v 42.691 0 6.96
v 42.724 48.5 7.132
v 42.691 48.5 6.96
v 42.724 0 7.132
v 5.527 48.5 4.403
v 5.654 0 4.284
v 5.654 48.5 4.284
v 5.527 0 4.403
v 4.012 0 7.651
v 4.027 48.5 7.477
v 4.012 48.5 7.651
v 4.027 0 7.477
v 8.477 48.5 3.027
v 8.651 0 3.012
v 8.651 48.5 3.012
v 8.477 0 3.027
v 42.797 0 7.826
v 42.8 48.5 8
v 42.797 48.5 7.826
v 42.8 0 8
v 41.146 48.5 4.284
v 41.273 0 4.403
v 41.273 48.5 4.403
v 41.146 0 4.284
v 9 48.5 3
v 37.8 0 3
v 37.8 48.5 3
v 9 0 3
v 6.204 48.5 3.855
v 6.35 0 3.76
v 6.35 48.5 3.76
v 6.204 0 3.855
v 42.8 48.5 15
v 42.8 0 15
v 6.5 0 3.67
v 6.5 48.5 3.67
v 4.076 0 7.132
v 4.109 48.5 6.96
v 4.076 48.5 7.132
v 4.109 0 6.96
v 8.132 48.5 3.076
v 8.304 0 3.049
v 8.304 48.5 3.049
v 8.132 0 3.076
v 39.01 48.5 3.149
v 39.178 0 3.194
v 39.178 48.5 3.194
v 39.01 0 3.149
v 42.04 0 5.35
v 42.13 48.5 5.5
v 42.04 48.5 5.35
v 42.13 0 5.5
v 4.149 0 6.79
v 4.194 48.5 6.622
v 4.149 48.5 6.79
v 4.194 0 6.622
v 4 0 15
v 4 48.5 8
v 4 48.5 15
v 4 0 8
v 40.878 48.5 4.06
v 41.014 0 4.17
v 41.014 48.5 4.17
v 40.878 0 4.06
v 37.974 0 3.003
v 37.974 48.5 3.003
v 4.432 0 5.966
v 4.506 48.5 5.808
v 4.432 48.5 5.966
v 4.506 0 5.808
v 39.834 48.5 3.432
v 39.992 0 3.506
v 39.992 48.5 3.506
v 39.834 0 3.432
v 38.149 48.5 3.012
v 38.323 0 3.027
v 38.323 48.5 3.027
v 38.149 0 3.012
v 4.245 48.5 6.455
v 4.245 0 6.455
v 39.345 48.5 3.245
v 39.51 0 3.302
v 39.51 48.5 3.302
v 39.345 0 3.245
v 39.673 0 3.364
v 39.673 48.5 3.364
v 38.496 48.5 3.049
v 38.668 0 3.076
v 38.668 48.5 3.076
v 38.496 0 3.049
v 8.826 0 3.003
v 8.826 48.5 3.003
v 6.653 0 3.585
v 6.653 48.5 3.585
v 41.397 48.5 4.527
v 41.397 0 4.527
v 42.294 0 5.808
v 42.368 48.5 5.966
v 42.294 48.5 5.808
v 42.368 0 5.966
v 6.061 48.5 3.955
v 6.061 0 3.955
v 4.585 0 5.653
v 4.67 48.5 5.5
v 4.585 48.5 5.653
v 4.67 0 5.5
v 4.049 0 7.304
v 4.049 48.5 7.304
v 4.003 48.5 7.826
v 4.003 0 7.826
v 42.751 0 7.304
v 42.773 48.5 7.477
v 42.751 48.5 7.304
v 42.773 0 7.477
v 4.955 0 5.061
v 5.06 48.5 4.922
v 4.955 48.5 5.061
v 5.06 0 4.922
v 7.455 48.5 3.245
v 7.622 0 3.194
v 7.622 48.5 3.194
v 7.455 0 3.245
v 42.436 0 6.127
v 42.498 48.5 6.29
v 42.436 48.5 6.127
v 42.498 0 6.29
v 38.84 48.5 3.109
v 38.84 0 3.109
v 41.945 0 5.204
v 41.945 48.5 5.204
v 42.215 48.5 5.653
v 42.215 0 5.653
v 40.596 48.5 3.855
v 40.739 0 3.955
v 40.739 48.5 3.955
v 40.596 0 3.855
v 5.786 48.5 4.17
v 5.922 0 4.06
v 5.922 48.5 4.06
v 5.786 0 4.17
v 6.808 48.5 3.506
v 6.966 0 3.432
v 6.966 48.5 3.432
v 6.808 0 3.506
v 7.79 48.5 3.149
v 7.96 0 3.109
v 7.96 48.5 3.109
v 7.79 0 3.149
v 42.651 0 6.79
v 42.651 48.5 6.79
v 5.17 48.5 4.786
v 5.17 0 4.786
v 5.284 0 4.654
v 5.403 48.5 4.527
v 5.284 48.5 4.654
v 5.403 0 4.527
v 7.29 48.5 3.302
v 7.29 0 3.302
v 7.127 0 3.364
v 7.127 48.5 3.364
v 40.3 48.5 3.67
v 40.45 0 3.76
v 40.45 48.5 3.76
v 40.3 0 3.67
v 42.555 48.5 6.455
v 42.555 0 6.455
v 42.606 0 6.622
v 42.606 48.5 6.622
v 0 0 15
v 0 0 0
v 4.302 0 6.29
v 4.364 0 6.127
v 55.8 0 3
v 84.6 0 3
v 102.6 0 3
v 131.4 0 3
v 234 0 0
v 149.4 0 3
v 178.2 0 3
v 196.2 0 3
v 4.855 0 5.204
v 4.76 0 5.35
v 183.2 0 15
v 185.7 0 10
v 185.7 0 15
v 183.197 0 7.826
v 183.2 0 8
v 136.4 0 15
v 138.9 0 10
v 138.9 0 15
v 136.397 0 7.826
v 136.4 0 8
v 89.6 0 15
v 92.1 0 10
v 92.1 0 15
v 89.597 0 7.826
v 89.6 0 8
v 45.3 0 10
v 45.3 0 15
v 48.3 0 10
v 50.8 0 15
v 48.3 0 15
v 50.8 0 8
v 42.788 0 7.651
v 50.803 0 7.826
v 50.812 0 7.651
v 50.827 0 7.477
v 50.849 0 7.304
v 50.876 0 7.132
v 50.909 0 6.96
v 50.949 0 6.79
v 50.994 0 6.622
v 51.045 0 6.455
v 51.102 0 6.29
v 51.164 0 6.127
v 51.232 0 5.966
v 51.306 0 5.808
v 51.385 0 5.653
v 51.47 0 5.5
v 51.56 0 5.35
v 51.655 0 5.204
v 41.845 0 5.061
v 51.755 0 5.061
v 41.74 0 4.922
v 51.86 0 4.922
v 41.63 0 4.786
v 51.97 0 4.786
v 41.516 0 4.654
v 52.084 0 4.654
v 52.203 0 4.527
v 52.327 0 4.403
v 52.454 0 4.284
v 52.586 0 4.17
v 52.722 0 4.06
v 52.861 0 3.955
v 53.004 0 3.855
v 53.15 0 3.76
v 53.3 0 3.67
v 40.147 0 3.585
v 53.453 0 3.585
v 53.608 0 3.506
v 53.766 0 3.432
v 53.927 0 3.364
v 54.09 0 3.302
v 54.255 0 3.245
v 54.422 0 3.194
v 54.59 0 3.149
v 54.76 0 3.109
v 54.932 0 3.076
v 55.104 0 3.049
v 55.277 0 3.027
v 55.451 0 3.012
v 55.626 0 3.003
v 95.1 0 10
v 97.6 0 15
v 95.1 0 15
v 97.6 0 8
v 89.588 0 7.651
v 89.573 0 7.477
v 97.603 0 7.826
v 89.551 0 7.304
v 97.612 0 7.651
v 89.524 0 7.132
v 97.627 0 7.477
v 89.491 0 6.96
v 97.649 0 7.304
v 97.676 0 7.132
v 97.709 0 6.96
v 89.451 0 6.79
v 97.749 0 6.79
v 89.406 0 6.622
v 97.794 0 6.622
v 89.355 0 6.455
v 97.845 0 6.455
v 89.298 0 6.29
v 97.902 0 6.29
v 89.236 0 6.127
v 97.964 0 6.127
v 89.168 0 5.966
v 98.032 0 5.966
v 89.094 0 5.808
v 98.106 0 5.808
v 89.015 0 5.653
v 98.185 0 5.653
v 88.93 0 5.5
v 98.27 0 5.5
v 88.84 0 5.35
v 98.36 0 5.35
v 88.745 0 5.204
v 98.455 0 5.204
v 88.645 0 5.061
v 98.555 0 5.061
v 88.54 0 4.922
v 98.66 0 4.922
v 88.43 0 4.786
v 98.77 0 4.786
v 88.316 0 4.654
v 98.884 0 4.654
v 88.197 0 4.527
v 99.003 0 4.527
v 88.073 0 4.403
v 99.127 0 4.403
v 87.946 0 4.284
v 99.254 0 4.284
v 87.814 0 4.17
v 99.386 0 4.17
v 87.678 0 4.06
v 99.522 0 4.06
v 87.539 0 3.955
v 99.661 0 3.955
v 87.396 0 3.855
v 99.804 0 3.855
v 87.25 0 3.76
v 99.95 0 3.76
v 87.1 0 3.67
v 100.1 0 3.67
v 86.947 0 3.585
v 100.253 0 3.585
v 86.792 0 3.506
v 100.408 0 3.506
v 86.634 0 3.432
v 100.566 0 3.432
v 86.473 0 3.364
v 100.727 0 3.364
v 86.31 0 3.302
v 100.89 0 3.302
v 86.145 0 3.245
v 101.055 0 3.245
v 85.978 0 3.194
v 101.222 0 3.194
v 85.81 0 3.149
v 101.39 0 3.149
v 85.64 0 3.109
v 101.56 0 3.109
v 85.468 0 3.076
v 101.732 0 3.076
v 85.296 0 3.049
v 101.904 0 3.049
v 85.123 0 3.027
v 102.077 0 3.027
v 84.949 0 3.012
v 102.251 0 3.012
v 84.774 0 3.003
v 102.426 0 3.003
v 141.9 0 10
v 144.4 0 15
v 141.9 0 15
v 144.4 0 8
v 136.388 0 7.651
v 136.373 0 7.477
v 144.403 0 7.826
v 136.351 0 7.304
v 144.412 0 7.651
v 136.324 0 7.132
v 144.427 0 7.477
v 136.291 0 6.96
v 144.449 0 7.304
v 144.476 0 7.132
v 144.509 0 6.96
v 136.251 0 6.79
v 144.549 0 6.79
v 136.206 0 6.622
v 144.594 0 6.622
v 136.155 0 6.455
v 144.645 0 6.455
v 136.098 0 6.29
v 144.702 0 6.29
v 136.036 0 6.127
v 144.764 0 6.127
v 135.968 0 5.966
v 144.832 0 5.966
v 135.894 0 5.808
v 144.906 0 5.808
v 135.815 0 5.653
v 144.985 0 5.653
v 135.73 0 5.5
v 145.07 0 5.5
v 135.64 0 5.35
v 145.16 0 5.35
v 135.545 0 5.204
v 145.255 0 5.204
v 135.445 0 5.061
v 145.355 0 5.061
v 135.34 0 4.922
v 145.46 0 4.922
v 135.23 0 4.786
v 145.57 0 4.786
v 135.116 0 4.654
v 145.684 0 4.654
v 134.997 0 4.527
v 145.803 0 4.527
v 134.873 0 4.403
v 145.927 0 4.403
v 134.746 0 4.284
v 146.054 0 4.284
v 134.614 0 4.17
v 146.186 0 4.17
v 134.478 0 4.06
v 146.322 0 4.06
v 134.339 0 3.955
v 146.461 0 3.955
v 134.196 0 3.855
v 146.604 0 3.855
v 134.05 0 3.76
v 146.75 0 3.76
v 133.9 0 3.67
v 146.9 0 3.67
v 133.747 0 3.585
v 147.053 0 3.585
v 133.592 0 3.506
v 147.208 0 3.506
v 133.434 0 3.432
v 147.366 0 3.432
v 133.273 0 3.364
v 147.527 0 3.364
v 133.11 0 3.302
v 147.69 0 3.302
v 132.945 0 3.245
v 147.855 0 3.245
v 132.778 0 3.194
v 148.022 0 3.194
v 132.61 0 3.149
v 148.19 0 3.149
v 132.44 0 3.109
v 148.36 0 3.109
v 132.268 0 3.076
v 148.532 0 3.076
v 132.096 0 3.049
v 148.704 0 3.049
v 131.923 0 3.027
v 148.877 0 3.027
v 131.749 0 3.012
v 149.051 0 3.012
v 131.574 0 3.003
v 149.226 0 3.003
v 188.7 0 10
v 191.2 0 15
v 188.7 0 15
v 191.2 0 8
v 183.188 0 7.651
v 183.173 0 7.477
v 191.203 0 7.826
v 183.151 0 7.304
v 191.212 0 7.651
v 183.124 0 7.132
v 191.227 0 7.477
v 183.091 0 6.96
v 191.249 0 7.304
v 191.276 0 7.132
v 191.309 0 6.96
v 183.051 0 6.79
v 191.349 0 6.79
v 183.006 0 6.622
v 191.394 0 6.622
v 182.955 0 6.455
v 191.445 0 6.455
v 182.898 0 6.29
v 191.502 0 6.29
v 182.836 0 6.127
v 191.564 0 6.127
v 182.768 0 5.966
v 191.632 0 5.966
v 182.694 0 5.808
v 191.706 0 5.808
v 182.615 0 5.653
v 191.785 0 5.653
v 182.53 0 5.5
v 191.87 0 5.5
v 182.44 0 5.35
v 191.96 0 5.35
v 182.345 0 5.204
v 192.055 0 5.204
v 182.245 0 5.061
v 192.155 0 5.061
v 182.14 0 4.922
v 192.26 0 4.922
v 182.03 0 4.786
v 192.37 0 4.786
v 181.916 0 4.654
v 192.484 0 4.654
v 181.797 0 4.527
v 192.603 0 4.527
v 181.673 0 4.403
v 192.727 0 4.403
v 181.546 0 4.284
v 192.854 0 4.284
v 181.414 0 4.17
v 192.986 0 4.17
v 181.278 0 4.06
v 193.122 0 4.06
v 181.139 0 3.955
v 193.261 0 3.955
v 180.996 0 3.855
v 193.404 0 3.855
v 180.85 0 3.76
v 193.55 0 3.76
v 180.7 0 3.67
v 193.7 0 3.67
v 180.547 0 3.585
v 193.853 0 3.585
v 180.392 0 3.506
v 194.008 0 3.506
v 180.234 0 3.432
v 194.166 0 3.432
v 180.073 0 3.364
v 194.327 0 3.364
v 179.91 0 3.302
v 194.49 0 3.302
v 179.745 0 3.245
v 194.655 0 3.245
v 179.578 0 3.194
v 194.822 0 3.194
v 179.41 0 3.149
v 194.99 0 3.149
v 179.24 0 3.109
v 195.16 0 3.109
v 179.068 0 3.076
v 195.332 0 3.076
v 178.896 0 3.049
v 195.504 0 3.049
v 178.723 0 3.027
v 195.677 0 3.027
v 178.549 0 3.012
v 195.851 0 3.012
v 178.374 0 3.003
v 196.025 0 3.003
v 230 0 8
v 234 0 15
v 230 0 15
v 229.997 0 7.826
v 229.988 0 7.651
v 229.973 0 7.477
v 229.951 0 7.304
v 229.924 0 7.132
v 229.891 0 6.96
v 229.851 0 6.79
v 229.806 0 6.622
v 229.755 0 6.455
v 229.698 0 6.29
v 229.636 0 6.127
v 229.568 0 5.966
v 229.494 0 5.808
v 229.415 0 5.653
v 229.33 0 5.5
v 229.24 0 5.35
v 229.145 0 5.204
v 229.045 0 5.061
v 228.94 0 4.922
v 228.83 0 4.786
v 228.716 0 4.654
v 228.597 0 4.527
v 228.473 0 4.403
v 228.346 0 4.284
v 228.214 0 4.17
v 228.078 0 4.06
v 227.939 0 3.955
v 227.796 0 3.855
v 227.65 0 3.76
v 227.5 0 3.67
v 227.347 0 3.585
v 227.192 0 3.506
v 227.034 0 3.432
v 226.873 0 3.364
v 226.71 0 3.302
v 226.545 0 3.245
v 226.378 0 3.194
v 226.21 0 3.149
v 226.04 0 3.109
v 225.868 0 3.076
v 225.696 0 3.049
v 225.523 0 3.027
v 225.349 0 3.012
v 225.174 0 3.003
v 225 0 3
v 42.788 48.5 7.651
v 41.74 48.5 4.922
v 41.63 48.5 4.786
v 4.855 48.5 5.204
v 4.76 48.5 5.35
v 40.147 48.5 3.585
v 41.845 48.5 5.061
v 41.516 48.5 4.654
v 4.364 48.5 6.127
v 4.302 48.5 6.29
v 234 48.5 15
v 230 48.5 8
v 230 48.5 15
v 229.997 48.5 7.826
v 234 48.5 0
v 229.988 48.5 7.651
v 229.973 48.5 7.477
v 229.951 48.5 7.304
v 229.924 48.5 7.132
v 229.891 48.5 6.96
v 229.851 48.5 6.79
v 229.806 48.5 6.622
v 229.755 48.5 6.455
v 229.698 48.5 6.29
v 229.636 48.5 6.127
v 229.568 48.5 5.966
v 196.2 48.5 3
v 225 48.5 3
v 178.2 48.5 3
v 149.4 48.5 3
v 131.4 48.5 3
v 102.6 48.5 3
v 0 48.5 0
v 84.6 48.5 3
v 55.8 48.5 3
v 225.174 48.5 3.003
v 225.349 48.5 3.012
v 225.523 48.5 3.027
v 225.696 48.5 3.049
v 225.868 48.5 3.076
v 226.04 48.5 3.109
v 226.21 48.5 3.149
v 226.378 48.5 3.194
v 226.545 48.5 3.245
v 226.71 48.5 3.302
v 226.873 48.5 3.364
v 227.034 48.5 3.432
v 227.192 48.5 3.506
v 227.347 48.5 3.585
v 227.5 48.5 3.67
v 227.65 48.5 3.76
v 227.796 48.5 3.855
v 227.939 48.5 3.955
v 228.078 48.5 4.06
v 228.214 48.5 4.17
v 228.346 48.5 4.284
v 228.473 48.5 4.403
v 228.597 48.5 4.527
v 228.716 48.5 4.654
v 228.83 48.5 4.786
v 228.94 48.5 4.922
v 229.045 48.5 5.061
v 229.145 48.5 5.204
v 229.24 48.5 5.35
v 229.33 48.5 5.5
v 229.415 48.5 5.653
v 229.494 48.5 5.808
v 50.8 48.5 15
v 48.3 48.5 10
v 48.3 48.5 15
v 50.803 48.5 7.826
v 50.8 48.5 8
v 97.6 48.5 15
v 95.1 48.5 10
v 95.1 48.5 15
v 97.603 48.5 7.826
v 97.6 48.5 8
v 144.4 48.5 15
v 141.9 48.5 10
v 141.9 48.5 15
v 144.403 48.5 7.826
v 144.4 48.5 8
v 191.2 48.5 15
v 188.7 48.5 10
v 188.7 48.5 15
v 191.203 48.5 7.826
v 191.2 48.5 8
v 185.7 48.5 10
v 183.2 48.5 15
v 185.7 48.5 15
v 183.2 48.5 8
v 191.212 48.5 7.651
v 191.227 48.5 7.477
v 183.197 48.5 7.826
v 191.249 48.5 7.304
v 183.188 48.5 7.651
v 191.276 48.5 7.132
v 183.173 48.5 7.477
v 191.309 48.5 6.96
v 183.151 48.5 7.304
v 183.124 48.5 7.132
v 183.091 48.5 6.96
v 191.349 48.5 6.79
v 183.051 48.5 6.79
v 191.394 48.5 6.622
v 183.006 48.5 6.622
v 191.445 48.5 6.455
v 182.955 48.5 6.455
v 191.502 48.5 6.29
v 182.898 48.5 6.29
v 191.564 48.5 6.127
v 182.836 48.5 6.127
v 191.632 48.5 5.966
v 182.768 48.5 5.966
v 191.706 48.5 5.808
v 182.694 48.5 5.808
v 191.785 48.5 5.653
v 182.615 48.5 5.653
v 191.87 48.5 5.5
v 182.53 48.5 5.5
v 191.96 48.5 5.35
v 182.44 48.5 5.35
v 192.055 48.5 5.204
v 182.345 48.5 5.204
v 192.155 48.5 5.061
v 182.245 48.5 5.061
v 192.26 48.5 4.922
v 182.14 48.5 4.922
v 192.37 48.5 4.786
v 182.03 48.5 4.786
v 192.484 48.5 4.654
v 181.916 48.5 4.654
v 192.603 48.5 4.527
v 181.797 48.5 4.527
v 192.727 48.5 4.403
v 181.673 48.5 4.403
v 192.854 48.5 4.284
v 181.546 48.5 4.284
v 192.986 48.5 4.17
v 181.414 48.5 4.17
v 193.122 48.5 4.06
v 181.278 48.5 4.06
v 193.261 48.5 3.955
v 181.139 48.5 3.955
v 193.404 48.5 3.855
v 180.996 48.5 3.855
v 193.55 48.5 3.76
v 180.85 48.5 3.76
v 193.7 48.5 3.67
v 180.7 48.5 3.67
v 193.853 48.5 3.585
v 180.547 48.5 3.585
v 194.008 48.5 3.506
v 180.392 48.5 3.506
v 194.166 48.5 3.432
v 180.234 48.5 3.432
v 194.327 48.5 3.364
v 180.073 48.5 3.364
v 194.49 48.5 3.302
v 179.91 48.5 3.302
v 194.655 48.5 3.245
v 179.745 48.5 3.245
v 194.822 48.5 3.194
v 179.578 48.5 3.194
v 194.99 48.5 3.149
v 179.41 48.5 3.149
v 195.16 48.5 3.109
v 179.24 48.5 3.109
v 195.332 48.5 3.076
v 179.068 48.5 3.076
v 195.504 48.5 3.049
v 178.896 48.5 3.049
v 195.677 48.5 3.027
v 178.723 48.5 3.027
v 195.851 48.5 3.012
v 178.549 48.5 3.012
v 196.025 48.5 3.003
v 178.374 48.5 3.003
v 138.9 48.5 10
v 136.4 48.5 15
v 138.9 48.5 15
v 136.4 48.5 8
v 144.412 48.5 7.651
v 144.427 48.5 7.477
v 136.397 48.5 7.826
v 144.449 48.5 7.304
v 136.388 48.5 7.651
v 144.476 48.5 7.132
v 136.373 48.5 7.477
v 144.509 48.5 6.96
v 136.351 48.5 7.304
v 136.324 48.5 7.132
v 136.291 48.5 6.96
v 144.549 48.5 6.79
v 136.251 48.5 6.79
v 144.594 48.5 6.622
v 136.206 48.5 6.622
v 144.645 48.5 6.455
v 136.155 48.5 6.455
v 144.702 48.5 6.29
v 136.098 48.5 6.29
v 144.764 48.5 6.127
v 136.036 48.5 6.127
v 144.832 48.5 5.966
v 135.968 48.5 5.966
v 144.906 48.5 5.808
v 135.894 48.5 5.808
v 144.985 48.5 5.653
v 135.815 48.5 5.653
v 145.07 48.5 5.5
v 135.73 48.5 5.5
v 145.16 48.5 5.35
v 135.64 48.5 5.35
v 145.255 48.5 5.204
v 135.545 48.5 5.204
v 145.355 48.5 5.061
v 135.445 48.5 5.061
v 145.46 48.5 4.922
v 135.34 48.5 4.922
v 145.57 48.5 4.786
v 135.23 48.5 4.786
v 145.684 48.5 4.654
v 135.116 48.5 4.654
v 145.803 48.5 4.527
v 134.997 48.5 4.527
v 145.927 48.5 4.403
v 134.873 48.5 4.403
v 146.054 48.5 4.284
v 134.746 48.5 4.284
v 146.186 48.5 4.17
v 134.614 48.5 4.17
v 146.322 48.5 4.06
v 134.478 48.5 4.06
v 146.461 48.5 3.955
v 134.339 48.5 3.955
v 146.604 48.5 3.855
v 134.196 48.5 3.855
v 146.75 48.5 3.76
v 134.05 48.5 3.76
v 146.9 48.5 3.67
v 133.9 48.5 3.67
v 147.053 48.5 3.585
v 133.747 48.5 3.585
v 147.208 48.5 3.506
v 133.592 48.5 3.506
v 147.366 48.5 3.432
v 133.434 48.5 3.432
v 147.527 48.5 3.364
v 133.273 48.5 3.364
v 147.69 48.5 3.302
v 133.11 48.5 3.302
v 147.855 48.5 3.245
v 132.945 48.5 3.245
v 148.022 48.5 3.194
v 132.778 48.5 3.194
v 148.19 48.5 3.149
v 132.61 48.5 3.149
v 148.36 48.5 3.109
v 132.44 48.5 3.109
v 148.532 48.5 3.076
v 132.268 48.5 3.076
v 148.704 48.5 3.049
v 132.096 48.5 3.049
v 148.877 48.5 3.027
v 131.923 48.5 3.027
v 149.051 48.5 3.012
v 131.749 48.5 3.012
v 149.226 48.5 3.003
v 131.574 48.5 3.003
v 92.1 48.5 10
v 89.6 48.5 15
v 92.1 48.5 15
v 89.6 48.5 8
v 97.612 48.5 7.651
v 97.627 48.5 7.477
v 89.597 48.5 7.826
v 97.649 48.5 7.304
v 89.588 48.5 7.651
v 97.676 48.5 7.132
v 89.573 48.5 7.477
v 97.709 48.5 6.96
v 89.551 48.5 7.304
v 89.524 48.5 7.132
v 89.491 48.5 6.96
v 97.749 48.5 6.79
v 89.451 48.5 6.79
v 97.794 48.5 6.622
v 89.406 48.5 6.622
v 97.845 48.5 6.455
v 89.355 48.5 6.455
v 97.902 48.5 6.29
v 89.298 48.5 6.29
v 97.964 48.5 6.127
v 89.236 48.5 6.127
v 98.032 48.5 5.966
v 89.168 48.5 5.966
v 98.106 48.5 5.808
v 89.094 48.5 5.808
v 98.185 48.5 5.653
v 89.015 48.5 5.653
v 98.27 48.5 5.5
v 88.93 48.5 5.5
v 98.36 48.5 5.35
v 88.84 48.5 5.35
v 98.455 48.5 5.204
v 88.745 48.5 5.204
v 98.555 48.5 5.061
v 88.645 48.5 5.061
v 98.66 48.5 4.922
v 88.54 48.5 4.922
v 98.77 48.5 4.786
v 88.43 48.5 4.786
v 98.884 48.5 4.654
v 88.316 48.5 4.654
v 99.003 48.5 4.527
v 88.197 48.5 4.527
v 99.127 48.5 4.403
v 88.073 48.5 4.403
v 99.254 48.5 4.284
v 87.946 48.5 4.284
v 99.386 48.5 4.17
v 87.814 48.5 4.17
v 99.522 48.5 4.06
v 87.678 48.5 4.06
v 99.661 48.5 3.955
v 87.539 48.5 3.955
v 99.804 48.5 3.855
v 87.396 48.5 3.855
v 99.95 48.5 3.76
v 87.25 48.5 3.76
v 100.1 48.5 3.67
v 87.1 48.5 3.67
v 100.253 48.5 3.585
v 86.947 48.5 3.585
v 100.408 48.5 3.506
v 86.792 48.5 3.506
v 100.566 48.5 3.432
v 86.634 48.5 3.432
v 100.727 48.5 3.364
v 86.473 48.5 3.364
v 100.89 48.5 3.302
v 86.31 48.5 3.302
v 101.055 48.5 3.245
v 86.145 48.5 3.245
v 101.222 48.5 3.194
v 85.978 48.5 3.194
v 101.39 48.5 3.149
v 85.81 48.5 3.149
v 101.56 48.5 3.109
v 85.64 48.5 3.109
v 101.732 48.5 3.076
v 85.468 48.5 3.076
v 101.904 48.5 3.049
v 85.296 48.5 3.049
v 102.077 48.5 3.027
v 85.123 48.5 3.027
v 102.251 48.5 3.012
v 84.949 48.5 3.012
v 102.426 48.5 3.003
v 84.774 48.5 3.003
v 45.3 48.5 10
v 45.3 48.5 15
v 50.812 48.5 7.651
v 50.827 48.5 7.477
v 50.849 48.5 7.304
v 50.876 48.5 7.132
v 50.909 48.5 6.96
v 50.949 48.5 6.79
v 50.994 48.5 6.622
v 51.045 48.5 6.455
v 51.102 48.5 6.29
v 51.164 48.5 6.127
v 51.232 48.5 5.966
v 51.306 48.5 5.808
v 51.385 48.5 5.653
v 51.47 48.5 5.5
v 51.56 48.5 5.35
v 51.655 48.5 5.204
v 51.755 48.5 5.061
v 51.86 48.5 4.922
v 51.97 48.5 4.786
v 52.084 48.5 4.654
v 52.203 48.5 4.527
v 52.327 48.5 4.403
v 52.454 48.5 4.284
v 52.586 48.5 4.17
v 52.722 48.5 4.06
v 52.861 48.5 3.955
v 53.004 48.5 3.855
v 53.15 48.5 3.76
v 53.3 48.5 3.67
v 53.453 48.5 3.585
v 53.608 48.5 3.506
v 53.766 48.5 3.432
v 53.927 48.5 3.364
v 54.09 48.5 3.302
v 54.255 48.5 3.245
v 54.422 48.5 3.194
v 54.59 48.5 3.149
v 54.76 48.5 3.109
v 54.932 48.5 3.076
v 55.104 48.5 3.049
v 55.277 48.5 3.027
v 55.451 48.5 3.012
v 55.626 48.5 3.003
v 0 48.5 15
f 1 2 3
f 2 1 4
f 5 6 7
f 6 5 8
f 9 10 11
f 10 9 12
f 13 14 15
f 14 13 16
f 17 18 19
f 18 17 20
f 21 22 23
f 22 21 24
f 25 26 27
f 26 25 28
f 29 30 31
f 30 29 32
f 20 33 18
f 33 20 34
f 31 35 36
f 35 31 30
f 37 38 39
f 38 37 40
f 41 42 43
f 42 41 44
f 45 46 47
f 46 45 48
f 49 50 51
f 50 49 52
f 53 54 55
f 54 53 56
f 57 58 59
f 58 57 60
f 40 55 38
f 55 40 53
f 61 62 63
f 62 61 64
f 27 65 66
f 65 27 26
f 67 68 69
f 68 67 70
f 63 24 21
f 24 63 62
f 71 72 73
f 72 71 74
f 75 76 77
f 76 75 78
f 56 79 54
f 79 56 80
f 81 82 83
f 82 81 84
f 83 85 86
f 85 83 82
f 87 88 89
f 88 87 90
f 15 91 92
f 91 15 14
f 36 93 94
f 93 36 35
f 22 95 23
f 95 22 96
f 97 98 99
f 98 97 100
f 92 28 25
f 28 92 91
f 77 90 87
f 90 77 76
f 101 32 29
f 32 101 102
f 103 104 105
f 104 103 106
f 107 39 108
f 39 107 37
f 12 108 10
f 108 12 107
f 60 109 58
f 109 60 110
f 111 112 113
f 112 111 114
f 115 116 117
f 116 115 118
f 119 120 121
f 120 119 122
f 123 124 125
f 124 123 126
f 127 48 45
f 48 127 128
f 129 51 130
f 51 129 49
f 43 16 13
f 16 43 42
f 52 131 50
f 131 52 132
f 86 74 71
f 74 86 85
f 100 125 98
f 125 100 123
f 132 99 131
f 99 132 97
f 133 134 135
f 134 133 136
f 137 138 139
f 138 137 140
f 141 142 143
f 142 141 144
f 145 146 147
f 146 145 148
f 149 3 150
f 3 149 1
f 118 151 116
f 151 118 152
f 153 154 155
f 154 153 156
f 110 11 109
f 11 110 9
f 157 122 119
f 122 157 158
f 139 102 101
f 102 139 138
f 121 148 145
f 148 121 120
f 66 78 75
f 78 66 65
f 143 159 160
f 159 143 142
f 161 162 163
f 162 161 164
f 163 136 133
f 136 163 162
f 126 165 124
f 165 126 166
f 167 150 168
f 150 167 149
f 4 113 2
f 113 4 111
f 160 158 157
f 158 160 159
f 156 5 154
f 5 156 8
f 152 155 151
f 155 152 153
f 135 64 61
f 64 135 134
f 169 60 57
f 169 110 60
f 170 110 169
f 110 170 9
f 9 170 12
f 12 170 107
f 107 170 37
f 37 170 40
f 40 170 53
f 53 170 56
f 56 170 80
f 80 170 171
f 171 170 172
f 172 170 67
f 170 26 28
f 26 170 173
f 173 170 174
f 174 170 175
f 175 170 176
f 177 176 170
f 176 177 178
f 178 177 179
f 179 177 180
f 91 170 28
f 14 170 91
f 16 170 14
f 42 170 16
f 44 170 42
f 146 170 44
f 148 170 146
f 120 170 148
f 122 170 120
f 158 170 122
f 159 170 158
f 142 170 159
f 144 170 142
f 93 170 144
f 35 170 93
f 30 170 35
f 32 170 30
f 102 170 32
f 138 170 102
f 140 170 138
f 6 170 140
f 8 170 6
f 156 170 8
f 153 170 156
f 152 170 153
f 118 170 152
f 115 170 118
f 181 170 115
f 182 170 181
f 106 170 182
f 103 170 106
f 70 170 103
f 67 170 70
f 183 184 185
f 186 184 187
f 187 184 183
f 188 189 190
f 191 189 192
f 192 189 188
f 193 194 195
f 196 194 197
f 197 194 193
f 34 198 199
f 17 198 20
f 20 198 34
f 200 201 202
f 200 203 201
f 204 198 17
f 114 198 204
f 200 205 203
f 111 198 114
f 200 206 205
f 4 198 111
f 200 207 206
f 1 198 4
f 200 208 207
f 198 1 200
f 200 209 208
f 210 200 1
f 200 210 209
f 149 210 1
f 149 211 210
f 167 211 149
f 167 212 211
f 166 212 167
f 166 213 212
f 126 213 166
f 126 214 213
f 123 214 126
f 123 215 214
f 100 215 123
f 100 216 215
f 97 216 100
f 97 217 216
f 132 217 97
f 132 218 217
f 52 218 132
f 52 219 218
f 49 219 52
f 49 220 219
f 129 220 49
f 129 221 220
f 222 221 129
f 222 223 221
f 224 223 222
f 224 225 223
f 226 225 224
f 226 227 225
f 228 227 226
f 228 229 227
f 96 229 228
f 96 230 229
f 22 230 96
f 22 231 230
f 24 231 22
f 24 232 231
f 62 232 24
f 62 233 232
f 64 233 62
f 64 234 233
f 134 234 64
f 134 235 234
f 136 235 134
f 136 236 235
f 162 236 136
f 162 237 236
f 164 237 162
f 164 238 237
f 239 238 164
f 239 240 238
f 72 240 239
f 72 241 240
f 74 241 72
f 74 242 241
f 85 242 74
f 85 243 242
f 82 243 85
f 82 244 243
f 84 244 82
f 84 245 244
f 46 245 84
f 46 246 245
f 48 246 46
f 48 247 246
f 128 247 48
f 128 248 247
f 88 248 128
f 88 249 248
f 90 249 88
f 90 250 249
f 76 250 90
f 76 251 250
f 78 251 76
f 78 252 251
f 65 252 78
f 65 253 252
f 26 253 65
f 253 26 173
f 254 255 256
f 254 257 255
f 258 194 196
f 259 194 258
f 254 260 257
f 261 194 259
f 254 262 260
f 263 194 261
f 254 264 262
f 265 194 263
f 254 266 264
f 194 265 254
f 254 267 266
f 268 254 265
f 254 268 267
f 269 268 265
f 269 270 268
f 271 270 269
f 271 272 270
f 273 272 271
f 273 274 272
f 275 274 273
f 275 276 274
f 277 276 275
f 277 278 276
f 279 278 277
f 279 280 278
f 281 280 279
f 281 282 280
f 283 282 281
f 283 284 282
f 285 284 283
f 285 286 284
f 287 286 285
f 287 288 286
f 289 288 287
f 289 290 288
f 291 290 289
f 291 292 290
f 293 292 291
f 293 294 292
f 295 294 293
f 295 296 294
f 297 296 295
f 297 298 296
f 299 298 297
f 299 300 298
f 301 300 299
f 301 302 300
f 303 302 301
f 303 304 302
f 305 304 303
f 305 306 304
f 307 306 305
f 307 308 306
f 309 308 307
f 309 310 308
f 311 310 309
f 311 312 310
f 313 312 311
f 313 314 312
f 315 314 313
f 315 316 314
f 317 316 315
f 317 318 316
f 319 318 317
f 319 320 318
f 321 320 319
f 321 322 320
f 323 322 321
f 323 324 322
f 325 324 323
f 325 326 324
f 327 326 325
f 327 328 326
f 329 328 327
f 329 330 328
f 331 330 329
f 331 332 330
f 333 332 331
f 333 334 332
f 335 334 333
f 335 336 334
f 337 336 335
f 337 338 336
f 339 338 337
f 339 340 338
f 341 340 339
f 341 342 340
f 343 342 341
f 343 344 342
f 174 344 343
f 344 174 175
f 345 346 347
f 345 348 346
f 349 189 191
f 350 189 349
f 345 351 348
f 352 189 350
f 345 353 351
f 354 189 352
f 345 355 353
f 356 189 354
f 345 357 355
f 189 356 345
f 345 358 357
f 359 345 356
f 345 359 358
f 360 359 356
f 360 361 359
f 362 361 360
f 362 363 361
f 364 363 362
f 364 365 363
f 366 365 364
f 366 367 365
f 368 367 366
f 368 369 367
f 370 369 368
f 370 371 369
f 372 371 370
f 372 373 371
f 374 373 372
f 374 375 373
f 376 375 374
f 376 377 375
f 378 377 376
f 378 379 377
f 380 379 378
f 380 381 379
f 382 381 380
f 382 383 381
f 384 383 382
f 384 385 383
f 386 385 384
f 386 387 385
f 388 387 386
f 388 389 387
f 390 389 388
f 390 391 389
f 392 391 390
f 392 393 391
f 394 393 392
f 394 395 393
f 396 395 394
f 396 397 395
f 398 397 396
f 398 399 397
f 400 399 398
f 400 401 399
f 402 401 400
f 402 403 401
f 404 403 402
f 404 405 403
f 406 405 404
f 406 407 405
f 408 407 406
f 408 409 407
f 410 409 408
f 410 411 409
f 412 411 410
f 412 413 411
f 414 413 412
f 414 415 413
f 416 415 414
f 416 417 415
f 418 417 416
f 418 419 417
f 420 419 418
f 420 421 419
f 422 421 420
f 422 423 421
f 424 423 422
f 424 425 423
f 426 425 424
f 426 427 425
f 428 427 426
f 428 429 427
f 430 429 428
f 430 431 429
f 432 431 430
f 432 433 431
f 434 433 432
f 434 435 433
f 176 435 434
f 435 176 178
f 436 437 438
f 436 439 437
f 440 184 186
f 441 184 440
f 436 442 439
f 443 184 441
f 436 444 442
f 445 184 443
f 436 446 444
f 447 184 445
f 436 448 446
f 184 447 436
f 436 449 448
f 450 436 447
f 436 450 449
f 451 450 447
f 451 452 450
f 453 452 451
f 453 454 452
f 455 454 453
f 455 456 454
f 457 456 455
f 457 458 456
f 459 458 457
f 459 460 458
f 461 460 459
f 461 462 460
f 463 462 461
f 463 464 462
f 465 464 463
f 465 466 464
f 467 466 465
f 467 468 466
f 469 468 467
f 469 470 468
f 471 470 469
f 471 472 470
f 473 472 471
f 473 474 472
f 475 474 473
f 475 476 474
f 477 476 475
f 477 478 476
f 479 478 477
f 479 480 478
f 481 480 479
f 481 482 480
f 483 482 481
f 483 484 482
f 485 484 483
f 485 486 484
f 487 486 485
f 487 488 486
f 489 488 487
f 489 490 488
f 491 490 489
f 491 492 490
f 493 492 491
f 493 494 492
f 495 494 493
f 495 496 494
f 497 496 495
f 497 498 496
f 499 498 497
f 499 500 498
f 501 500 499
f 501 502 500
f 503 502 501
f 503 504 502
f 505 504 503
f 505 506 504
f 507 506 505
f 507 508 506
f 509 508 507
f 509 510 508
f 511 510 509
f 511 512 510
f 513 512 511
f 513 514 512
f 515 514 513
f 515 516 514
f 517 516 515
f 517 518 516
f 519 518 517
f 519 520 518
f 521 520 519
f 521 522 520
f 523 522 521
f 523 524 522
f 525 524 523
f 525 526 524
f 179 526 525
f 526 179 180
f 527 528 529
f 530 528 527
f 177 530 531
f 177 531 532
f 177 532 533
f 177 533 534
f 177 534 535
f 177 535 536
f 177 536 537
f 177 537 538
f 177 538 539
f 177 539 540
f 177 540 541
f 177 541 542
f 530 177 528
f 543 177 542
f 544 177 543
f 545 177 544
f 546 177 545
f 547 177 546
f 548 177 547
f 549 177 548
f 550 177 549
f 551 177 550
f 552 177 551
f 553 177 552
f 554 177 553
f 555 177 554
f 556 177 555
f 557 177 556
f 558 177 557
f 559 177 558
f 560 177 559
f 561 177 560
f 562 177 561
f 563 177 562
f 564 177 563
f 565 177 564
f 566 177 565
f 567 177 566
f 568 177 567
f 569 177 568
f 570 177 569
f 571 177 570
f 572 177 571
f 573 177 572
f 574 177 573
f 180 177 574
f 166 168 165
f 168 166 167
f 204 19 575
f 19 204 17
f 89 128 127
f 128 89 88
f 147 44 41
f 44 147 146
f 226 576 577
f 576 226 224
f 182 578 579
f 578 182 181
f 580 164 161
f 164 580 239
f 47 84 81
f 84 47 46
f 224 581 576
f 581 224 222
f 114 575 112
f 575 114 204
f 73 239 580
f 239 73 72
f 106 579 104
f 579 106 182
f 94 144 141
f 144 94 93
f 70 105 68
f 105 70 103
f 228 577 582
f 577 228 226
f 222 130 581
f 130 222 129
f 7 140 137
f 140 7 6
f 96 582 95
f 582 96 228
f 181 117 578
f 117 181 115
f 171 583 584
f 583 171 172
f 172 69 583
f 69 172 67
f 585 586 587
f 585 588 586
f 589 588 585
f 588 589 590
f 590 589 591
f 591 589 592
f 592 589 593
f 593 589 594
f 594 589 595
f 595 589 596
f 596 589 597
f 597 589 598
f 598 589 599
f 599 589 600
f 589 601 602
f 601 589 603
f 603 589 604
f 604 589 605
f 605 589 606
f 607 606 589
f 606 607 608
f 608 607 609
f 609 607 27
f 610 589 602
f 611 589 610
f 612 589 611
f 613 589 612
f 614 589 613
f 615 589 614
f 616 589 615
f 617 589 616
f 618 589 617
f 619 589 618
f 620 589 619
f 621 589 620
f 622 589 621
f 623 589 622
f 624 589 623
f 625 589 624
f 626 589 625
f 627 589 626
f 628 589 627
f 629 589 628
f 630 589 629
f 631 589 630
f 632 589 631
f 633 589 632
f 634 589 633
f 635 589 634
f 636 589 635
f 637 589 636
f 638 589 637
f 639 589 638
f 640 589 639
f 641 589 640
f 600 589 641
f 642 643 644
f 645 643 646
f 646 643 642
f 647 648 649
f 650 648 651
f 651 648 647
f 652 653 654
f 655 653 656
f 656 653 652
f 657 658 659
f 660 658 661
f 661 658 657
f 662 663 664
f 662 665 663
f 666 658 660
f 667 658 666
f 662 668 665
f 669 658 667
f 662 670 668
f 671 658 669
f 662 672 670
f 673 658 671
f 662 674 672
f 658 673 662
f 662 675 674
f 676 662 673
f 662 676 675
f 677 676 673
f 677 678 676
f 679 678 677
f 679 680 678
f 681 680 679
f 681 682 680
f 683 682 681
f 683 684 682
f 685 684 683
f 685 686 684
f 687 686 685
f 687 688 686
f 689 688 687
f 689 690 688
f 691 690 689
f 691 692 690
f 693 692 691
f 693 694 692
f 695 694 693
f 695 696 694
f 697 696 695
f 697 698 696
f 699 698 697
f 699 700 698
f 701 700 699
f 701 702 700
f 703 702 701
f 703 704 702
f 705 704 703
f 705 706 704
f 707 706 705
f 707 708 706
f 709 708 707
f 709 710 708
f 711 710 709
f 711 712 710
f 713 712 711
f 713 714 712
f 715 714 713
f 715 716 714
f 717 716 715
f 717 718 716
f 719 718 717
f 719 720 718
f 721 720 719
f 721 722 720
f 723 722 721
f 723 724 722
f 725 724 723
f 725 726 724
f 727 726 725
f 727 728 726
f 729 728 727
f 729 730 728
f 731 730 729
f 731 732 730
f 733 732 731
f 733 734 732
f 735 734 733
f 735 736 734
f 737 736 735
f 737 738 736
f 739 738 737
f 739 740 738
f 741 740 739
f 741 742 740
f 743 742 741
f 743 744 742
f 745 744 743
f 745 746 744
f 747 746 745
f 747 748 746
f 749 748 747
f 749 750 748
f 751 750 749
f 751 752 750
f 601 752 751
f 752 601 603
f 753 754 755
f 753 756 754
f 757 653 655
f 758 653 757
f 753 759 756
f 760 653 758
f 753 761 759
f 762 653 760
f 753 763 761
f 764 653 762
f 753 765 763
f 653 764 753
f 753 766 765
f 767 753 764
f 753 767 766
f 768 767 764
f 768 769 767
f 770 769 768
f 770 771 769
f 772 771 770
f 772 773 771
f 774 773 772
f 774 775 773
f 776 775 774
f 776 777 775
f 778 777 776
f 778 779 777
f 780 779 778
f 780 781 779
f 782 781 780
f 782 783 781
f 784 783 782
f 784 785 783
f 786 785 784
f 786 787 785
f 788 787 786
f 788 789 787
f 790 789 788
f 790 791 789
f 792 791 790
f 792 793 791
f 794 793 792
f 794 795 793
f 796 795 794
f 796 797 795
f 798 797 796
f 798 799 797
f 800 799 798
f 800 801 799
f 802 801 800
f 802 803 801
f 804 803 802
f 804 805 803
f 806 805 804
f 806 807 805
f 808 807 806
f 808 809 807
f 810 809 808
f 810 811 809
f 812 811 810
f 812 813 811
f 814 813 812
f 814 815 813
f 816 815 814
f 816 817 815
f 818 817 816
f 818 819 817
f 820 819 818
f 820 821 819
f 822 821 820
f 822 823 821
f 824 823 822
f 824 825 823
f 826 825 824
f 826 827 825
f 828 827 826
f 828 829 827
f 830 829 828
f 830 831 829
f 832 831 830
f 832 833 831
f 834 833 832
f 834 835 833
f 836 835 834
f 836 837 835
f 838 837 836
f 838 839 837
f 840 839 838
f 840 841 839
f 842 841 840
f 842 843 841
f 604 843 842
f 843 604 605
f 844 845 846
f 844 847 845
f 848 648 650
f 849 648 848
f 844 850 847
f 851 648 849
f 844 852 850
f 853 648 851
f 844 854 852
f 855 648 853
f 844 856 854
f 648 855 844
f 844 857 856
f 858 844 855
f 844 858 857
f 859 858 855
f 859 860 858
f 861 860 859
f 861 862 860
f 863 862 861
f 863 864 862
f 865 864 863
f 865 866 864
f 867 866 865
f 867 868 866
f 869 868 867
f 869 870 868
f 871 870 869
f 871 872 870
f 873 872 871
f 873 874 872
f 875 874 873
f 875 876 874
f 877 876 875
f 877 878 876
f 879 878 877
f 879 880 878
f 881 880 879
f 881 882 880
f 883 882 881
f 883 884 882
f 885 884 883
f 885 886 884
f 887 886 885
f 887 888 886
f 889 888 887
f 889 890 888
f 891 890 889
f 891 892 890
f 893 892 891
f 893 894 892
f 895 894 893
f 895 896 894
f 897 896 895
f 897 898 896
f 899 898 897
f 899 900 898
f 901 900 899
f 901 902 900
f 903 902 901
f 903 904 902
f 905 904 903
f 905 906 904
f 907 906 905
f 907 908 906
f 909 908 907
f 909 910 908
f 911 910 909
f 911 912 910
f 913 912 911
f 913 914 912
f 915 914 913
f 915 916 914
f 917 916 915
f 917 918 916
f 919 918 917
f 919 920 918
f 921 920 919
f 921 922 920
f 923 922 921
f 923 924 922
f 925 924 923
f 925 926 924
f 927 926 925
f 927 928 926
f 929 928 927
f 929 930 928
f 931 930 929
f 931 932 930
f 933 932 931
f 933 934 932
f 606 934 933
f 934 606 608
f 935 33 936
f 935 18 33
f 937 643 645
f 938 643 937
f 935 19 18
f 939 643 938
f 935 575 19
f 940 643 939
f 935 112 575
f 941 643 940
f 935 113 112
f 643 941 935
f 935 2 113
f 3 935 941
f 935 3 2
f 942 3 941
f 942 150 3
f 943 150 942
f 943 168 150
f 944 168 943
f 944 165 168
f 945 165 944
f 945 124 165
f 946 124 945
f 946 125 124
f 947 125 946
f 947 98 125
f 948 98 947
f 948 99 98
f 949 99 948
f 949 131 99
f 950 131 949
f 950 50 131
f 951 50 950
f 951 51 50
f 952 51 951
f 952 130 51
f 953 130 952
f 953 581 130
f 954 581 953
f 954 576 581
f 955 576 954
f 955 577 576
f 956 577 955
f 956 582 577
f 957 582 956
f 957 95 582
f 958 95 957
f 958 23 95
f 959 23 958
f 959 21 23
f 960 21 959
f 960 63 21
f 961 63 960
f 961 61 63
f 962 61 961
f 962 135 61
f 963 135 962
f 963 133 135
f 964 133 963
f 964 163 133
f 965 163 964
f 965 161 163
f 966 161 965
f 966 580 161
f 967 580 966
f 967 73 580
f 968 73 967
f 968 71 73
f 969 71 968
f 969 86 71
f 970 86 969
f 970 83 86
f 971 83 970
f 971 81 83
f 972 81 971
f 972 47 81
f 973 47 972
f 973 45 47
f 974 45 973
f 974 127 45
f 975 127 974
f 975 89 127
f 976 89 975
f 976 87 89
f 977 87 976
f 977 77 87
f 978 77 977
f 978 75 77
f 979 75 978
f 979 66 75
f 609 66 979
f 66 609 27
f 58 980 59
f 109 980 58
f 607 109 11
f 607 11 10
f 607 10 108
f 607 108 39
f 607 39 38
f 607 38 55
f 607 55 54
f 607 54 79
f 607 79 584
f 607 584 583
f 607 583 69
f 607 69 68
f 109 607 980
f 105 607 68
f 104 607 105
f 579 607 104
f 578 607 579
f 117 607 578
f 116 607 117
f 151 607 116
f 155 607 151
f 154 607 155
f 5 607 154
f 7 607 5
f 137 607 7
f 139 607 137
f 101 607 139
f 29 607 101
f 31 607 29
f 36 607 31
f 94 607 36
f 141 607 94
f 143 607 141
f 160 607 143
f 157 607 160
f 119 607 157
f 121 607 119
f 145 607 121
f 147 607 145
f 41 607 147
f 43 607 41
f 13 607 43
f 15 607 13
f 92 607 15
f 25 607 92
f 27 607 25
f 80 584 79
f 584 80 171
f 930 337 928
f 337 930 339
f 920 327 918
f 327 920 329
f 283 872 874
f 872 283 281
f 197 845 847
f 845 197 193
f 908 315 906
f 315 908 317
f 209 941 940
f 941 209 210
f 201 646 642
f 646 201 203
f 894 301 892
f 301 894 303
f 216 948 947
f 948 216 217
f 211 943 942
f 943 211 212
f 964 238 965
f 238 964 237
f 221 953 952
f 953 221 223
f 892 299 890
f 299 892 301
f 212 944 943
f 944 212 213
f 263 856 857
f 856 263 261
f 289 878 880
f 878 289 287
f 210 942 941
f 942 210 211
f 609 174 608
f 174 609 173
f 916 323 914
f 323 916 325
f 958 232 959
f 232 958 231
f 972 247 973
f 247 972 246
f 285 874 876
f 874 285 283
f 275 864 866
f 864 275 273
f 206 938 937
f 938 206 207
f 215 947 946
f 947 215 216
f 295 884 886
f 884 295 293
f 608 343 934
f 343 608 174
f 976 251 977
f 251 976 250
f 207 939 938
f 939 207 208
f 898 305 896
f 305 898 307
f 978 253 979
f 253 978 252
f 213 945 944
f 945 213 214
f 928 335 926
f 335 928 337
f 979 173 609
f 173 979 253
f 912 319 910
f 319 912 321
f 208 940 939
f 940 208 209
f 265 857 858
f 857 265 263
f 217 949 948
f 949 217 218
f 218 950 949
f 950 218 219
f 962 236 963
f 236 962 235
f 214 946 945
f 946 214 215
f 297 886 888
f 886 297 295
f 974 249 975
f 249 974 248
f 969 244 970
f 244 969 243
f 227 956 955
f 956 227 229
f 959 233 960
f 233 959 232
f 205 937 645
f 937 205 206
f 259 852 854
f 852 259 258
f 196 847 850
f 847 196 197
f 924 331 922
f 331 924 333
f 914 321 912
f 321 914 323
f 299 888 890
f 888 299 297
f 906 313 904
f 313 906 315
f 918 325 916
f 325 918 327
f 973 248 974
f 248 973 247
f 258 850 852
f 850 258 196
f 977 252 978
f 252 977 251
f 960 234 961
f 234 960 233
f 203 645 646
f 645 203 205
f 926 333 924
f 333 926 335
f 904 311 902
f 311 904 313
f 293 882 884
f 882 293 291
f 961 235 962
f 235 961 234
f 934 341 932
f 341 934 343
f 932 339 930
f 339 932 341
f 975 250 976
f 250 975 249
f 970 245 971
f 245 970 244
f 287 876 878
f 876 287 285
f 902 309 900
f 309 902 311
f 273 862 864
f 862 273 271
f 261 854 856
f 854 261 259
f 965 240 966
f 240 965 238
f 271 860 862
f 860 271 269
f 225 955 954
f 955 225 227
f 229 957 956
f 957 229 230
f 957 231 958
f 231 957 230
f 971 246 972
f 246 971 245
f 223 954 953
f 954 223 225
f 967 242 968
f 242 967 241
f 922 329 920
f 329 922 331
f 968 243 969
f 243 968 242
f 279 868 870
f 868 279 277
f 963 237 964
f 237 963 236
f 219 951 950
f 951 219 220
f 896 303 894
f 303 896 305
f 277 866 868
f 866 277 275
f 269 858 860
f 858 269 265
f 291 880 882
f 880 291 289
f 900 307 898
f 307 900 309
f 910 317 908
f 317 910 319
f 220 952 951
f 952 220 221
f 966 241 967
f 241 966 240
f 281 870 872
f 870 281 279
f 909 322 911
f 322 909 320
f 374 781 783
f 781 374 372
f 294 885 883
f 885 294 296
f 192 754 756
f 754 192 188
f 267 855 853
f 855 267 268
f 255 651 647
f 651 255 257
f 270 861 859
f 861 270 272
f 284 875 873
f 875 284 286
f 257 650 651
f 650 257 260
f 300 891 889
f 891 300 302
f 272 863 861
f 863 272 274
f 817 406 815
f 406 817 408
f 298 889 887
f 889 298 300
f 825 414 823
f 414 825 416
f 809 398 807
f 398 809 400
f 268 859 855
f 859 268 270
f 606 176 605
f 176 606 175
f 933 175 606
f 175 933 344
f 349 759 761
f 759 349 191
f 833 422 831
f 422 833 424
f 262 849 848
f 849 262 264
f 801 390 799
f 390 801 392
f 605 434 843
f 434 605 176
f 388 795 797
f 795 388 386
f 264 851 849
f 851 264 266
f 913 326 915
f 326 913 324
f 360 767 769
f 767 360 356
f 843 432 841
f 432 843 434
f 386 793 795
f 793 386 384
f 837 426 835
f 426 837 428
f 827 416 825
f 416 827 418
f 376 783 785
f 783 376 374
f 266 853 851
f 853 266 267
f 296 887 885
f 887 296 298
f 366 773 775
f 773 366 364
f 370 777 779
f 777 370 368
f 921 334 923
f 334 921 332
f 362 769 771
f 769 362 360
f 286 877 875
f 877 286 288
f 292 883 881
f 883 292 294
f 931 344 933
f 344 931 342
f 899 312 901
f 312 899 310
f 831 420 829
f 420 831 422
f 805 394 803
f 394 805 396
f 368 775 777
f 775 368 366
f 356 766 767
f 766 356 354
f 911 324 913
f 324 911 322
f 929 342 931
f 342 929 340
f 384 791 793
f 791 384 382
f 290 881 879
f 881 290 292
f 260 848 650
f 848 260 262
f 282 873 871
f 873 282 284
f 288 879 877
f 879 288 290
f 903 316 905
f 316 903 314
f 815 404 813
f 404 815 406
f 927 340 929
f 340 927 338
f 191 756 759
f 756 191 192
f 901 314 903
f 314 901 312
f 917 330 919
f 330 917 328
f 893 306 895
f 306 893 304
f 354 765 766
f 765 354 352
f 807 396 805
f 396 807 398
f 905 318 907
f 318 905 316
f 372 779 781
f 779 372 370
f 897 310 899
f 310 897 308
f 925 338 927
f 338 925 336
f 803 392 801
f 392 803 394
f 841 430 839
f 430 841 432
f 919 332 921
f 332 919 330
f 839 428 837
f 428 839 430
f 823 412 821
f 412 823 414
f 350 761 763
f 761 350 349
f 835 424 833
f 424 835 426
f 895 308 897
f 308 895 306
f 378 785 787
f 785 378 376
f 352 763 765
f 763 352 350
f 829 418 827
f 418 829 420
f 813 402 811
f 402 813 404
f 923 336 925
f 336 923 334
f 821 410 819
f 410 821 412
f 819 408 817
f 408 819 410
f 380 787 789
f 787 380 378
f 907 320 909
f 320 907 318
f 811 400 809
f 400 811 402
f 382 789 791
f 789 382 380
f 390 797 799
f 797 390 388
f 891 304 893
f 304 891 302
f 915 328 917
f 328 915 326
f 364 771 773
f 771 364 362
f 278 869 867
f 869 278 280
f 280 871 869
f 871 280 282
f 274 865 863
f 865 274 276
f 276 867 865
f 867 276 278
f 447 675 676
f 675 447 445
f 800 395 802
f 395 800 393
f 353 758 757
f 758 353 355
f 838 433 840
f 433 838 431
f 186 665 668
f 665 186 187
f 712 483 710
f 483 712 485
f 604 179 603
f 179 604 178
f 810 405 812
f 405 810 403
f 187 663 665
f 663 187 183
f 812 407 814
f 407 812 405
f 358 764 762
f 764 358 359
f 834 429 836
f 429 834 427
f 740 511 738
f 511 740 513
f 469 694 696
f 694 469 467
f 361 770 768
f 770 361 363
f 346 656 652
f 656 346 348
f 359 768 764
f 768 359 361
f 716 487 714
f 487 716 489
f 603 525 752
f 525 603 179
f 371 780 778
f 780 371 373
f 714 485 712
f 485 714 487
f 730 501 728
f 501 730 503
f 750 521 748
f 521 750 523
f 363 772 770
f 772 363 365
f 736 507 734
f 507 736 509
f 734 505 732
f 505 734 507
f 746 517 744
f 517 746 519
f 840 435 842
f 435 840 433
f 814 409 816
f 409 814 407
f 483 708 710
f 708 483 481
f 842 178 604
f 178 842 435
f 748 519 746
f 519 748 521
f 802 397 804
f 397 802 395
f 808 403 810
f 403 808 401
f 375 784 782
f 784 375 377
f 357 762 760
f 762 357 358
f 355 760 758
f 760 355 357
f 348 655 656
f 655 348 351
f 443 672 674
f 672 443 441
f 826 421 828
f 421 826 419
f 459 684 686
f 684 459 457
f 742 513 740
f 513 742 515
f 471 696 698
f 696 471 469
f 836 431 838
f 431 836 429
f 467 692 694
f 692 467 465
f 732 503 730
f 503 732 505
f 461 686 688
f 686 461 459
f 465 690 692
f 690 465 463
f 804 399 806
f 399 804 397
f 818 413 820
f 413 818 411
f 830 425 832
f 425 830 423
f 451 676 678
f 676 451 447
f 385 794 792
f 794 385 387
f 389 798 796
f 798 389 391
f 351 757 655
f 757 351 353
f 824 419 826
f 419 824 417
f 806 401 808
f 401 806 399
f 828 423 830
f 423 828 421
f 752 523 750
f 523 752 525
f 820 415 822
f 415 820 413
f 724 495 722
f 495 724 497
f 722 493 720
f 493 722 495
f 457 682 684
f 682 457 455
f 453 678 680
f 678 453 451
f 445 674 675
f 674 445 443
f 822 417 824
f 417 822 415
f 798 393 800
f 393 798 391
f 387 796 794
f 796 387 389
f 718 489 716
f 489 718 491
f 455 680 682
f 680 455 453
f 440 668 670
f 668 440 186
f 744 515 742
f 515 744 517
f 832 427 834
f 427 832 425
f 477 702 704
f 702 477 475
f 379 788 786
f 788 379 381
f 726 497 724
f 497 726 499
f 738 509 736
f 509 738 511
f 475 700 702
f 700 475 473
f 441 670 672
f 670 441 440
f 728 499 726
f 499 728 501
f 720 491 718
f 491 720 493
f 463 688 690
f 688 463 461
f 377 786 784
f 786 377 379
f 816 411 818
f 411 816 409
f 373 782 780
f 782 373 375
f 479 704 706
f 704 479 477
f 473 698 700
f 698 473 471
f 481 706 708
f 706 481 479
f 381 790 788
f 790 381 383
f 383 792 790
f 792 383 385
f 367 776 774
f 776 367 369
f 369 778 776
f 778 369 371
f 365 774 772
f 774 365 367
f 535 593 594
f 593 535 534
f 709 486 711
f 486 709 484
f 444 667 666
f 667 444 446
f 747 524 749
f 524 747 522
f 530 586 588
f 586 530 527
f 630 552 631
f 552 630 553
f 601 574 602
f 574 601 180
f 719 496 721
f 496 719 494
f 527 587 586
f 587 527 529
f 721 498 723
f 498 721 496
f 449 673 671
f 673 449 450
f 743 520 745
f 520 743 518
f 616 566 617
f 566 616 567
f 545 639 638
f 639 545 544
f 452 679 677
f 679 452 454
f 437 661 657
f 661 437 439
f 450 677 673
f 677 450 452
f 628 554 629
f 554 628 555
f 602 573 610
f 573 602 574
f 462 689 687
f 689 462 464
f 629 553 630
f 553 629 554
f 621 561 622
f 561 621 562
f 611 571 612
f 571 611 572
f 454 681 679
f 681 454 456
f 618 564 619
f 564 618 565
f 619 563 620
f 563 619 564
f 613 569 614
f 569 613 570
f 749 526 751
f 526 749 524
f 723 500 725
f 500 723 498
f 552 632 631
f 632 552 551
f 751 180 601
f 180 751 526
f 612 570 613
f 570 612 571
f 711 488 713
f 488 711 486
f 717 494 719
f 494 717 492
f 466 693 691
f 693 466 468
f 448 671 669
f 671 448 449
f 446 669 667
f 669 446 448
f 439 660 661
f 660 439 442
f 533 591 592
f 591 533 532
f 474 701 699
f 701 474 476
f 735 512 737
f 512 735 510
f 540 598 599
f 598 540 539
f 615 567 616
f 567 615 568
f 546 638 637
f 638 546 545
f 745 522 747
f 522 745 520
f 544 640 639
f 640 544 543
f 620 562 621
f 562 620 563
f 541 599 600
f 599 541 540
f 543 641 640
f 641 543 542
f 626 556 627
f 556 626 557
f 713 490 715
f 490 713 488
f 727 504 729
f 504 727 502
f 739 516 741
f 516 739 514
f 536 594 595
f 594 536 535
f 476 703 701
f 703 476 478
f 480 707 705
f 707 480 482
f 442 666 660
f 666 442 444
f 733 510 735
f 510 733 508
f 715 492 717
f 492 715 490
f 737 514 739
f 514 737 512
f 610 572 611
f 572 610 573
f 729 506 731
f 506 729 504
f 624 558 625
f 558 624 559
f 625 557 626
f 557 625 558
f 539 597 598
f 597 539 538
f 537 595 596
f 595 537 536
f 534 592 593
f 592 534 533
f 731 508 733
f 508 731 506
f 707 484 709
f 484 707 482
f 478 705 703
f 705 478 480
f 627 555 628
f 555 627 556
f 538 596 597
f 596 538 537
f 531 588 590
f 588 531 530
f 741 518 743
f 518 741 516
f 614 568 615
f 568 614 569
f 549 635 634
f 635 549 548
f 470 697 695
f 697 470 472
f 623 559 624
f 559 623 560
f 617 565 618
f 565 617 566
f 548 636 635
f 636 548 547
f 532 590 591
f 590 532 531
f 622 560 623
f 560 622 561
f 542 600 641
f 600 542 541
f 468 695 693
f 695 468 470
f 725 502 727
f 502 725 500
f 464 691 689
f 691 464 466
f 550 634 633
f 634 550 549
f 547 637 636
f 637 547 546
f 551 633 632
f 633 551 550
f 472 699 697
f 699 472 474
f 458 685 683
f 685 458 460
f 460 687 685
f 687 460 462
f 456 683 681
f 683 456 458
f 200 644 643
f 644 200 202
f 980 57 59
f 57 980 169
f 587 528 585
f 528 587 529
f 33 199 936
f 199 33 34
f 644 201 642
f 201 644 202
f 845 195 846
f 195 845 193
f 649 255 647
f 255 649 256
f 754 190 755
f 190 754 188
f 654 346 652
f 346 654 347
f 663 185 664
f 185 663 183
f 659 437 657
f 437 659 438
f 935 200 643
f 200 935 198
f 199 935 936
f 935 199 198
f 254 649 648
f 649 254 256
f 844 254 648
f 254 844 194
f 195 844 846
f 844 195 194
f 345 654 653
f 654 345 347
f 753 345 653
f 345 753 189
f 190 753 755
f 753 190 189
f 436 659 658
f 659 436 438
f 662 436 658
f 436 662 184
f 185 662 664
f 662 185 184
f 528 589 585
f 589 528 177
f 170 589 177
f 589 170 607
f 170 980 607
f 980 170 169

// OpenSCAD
// Parameters
bracket_length = 234;
bracket_width = 48.5;
bracket_height = 3;
slot_width = 8;
slot_height = 12;
notch_width = 3;
notch_height = 5;
cutout_count = 5;
cutout_radius = 5;

cutout_length = (bracket_length - (slot_width * cutout_count)) / cutout_count;

module cutout() {    
    translate([(cutout_length/2), bracket_width/2, (slot_height/2 + cutout_radius + bracket_height)]) {
        rotate([90, 0, 0]) {
            minkowski() {
                cube([cutout_length-(cutout_radius*2), slot_height, bracket_width/2], center=true);
                cylinder(r=cutout_radius, h=bracket_width/2, center=true, $fn=180);
            }
        }
    }
}

module cutouts() {
    for (x=[slot_width/2:cutout_length+slot_width:(bracket_length-slot_width)]) {
        translate([x, 0, 0]) {
            cutout();
        }
    }
}

module notch() {    
    translate([-notch_width/2, 0, bracket_height+slot_height-notch_height]) {
        cube([notch_width, bracket_width, notch_height]);
    }
}

module notches() {
    notch_gap = cutout_length+slot_width;
    for (x=[notch_gap:notch_gap:bracket_length-notch_gap]) {
        translate([x, 0, 0]) {
            notch();
        }
    }
}

module bracket() {
    difference() {
        cube([bracket_length, bracket_width, (bracket_height + slot_height)]);
        cutouts();
        notches();
    }
}

bracket();
